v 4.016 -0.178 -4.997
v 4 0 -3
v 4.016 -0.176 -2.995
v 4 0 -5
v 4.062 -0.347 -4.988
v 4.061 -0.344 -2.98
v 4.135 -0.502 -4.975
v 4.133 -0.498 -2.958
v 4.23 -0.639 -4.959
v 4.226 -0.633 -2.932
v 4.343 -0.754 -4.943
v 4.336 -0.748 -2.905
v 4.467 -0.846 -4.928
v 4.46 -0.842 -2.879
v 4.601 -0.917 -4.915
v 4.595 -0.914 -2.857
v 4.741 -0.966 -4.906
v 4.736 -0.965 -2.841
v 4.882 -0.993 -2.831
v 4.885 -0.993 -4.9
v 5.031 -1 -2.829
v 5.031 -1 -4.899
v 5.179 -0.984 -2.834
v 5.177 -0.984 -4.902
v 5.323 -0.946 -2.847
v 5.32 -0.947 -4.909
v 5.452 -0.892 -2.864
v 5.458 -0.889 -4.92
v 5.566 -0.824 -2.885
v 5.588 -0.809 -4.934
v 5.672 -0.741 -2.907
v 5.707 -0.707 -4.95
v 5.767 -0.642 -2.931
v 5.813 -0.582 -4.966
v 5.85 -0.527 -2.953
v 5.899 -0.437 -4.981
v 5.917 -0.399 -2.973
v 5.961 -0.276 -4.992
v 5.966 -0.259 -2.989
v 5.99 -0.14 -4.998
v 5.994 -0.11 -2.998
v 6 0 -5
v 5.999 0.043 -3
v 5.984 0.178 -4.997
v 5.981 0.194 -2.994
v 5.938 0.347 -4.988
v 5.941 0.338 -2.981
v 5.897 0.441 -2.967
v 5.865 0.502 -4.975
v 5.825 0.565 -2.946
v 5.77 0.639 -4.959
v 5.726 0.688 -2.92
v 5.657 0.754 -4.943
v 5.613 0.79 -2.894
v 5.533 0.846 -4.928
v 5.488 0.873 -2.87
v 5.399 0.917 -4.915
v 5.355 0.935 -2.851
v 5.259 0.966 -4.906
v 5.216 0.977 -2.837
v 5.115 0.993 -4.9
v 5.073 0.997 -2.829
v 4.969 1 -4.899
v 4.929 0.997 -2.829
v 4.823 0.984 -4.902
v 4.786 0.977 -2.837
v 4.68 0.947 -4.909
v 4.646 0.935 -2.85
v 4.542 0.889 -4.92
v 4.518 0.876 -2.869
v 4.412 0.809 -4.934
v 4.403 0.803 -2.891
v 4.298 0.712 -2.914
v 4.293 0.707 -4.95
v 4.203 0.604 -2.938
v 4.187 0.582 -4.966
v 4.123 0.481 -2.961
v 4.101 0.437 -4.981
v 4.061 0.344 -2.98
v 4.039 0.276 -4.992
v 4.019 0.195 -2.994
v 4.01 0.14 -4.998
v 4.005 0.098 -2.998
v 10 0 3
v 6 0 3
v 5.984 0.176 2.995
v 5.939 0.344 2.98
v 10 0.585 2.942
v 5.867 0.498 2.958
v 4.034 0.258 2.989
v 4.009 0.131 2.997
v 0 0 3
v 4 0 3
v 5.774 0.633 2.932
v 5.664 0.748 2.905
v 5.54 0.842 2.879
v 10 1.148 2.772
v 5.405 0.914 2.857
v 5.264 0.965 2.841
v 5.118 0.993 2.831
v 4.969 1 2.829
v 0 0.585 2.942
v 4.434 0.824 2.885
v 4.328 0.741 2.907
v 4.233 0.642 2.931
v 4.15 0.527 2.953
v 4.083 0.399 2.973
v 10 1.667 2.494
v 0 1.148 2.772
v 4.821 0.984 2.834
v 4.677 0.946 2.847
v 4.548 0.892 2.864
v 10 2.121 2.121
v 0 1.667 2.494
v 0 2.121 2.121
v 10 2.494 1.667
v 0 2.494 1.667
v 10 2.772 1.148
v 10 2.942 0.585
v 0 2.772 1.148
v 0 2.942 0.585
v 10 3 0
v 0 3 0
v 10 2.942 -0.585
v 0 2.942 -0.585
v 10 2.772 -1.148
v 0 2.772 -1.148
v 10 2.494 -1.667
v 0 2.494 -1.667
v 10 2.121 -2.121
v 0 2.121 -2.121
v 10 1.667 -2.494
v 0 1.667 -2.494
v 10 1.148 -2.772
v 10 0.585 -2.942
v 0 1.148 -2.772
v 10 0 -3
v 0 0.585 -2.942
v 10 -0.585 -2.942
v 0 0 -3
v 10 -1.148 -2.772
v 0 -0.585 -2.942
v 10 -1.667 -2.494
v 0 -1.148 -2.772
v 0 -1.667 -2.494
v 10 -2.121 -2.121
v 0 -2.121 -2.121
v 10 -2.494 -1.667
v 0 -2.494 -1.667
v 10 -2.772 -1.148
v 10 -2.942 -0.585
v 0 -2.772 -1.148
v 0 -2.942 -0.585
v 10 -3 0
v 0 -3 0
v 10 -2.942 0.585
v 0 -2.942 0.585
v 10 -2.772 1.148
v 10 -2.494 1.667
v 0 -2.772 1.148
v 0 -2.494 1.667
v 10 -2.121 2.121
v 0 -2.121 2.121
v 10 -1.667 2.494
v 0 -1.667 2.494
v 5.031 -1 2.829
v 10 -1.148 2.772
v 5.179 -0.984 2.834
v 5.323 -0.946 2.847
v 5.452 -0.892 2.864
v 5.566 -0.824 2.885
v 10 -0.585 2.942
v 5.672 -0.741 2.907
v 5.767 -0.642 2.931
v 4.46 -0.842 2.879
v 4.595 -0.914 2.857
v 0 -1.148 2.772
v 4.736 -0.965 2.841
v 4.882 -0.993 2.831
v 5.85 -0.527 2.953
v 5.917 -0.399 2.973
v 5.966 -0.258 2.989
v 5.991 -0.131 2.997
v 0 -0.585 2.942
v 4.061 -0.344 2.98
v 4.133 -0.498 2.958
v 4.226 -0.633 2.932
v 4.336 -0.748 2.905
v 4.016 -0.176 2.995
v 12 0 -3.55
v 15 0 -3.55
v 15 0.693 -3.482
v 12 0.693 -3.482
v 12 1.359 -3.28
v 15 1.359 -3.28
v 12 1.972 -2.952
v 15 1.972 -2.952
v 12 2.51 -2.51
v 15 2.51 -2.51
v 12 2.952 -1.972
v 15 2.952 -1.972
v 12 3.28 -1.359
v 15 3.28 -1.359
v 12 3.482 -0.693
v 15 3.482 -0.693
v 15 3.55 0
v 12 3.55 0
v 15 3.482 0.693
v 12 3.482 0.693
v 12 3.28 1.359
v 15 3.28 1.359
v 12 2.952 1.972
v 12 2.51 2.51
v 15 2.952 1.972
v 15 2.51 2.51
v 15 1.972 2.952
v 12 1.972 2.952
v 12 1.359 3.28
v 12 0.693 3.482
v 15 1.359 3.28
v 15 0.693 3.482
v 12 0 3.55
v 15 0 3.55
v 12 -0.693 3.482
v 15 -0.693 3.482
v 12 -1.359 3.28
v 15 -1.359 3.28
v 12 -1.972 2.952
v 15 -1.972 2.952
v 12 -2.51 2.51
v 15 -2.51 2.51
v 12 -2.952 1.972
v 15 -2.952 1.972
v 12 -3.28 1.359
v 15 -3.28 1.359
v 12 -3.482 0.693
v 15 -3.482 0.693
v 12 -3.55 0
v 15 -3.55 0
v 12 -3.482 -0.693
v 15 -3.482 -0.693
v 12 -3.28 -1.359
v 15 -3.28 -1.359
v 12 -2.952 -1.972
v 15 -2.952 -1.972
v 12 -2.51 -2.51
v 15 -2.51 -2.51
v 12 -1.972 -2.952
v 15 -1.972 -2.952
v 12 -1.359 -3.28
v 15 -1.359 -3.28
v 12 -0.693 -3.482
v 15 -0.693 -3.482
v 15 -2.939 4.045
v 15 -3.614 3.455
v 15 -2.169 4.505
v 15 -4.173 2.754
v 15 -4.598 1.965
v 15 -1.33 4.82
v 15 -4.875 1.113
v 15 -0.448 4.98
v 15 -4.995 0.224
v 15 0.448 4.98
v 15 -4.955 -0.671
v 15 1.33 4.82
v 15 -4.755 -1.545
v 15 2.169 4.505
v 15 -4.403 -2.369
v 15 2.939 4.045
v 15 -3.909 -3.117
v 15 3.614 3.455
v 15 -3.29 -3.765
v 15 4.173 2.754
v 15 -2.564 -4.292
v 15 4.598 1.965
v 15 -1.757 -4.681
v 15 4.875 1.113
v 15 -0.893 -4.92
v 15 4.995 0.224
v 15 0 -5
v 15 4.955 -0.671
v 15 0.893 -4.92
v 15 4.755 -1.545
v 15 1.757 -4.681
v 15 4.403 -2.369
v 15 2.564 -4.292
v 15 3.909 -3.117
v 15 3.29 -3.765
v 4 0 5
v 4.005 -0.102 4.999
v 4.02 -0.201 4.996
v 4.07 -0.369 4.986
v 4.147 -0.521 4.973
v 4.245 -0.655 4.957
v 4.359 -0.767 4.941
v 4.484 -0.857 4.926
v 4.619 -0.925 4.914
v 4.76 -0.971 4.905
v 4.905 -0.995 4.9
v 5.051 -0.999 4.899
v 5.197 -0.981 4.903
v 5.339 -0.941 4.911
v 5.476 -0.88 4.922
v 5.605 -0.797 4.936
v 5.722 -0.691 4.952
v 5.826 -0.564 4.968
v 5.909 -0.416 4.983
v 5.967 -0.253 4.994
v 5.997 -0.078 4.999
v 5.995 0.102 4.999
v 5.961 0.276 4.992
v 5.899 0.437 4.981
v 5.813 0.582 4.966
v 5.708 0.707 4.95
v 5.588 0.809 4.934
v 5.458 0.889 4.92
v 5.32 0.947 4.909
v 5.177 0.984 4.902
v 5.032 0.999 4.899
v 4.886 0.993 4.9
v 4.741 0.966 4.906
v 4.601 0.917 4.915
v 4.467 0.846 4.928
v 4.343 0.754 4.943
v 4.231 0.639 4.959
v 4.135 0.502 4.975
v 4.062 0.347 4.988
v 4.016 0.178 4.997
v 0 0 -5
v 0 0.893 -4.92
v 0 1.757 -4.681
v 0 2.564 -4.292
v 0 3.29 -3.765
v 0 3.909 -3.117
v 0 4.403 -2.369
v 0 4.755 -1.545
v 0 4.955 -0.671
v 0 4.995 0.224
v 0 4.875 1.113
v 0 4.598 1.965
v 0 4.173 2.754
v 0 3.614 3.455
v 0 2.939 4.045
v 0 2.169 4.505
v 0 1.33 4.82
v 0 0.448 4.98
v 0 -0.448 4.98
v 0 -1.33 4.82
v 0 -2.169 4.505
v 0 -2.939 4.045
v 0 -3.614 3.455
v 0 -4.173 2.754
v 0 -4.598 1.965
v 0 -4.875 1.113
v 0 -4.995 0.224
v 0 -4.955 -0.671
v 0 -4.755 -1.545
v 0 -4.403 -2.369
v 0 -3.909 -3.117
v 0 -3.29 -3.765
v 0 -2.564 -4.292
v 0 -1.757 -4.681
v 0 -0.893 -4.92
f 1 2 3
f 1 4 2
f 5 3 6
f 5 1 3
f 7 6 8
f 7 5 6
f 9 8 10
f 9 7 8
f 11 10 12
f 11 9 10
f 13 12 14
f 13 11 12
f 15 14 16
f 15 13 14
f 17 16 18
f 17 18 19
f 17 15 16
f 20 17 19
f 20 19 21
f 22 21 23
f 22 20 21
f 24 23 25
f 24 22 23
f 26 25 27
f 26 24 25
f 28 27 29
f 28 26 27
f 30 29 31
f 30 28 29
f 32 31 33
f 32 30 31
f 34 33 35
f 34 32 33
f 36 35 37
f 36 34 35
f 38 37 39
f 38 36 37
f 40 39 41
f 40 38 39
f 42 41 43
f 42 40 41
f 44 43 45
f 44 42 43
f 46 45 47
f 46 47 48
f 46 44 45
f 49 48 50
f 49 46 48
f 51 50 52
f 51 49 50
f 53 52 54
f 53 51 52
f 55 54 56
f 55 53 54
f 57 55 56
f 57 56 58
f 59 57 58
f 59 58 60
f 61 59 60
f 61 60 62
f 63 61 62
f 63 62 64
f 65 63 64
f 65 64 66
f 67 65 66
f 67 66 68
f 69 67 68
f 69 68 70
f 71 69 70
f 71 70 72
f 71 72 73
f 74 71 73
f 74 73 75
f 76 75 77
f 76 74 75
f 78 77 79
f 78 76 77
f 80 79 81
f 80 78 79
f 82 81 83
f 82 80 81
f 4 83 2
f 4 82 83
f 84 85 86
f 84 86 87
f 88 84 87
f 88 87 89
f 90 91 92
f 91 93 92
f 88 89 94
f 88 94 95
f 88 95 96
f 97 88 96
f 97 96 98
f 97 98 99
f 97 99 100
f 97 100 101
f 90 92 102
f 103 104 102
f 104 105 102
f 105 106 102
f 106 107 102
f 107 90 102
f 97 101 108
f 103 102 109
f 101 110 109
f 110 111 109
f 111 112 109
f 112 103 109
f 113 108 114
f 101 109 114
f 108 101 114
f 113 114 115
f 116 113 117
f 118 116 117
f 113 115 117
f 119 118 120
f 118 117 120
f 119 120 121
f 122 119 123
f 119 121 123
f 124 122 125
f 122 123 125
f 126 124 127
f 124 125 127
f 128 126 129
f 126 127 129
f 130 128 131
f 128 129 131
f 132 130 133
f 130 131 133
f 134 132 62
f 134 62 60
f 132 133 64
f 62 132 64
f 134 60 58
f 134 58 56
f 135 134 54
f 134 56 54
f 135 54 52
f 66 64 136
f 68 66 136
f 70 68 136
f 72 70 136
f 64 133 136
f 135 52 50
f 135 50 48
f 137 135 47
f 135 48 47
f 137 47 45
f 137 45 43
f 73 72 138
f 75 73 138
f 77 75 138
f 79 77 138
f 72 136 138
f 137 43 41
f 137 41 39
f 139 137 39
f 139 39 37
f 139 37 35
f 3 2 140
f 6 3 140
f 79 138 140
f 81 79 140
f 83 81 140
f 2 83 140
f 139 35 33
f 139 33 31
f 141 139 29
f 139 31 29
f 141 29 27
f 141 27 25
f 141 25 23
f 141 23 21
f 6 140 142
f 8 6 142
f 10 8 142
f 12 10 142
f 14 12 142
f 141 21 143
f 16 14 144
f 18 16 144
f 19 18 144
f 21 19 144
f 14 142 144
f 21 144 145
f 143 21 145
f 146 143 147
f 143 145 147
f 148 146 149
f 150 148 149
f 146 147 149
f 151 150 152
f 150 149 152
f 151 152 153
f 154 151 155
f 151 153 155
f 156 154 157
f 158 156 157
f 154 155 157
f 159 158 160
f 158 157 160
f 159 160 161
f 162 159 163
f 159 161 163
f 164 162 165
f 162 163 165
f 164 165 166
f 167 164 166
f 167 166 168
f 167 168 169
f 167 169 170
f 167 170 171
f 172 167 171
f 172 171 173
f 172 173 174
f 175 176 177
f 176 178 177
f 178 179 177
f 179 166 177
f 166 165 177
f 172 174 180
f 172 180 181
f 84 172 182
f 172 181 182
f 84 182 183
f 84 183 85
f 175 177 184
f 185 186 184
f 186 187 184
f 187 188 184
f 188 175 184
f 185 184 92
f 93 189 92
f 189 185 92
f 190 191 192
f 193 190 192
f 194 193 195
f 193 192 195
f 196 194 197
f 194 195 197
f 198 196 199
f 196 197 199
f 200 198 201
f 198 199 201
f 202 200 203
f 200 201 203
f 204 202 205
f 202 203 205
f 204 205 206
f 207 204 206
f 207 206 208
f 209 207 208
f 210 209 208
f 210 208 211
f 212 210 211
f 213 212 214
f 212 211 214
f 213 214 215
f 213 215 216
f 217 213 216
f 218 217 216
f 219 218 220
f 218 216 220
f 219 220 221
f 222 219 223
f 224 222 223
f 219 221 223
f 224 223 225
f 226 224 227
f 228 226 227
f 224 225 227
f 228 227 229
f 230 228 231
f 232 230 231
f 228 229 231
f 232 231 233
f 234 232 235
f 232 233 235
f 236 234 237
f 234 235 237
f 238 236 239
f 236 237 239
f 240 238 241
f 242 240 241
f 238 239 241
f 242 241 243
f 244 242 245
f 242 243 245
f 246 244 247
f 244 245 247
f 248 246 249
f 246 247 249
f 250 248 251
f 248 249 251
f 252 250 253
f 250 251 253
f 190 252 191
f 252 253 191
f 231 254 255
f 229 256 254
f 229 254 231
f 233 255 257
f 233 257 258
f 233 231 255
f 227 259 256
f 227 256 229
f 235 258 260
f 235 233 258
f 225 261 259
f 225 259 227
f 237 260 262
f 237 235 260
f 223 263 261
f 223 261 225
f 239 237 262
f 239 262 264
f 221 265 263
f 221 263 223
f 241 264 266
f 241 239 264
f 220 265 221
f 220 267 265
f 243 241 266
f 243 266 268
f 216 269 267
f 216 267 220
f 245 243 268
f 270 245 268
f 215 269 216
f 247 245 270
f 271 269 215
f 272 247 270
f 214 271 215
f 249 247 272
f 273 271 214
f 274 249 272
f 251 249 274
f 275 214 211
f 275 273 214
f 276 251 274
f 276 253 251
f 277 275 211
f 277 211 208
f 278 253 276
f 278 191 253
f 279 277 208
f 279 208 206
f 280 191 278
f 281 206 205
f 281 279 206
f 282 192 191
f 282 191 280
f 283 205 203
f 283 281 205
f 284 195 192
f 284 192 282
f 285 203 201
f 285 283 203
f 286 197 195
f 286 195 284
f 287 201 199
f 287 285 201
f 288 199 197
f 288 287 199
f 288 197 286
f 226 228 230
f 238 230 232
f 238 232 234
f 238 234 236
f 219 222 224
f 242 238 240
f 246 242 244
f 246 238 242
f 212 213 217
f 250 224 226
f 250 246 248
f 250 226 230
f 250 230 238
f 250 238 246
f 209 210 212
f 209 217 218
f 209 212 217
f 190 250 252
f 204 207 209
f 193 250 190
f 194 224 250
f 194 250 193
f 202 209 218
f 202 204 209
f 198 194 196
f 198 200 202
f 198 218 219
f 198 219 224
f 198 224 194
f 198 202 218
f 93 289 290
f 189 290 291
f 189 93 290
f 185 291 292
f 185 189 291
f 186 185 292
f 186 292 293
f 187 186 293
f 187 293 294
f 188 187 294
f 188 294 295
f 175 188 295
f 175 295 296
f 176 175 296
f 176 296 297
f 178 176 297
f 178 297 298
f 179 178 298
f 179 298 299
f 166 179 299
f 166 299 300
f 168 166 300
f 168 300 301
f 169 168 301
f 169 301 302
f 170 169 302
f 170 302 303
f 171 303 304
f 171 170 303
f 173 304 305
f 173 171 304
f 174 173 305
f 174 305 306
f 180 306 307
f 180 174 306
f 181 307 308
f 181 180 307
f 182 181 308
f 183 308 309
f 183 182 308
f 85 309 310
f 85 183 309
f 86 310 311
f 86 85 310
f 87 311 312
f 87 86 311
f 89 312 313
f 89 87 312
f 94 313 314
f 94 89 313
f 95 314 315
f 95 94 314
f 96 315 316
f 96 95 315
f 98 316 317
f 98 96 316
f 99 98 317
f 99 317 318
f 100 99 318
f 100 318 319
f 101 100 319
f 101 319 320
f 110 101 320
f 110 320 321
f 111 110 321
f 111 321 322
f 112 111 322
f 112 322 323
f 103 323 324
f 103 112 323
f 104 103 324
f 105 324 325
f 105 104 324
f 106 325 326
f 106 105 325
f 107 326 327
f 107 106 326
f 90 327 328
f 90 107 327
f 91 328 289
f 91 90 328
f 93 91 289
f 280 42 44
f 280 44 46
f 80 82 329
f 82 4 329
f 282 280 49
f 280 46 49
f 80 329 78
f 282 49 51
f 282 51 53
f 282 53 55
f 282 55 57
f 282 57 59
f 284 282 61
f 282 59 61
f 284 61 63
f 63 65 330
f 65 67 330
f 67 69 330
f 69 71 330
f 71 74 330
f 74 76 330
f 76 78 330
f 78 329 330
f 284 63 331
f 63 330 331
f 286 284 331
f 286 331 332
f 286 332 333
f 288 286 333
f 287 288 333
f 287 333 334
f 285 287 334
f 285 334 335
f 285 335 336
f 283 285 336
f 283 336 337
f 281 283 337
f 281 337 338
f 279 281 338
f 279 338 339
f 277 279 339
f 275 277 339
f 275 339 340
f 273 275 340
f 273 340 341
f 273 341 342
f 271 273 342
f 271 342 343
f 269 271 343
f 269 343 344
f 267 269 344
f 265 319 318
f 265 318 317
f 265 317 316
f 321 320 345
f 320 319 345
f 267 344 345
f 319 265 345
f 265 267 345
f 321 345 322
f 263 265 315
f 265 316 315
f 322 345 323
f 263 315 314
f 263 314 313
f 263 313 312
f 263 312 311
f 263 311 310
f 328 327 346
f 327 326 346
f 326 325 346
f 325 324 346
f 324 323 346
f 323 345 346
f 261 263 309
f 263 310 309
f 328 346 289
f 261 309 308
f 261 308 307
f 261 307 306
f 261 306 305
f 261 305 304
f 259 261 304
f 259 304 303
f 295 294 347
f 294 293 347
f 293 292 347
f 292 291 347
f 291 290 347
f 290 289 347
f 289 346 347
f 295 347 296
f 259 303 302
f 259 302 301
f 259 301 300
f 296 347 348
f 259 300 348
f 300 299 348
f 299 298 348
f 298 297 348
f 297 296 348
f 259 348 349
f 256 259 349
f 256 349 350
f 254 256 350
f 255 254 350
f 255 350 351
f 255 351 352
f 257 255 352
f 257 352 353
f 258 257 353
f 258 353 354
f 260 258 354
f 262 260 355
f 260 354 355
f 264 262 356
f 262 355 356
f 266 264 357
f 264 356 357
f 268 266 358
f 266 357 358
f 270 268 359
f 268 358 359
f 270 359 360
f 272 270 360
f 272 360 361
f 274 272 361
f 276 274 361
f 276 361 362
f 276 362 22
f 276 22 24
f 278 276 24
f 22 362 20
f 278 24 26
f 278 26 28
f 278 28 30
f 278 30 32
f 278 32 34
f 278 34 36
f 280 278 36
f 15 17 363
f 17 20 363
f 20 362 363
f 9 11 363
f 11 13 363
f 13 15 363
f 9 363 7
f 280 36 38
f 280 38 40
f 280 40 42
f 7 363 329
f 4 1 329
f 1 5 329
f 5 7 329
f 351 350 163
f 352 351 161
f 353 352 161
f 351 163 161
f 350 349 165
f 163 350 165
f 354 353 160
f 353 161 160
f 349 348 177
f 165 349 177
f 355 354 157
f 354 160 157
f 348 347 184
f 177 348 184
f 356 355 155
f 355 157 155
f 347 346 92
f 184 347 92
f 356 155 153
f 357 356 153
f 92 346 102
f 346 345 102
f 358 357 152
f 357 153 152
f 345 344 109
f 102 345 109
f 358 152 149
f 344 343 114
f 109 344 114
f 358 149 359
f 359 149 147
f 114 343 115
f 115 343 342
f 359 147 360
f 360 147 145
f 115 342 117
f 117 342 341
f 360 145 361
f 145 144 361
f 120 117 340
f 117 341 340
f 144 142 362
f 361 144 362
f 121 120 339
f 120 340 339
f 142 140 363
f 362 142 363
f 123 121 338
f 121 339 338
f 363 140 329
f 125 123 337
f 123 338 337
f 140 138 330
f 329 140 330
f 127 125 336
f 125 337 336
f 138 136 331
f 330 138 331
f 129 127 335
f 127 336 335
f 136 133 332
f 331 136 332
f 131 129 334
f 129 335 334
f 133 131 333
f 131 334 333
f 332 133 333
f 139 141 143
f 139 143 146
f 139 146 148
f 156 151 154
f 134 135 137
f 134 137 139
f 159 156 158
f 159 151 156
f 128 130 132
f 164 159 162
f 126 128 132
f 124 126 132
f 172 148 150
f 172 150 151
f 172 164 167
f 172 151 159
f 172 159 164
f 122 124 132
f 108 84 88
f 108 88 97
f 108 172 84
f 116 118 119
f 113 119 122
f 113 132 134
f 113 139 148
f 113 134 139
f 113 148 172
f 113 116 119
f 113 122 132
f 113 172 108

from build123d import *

# Parameters (mm, degrees)
SKETCH_1_R               = 5
EXTRUDE_1_DEPTH          = 15
SKETCH_2_R               = 3.55
CUT_EXTRUDE_1_DEPTH      = 3
SKETCH_3_R               = 3
CUT_EXTRUDE_2_DEPTH      = 10
CUT_EXTRUDE_3_DEPTH      = 5
CUT_EXTRUDE_3_DEPTH_BACK = 5
SKETCH_4_R               = 1


with BuildPart() as part:
    # 草图1 → 凸台-拉伸1 (new body)
    with BuildSketch(Plane(origin=(0, 0, 0), x_dir=(0, 0, -1), z_dir=(1, 0, 0))):
        Circle(SKETCH_1_R)
    extrude(amount=EXTRUDE_1_DEPTH)

    # 草图2 → 切除-拉伸1 (cut)
    with BuildSketch(Plane(origin=(15, 0, 0), x_dir=(0, 0, -1), z_dir=(1, 0, 0))):
        Circle(SKETCH_2_R)
    extrude(amount=-CUT_EXTRUDE_1_DEPTH, mode=Mode.SUBTRACT)

    # 草图3 → 切除-拉伸2 (cut)
    with BuildSketch(Plane.ZY):
        Circle(SKETCH_3_R)
    extrude(amount=-CUT_EXTRUDE_2_DEPTH, mode=Mode.SUBTRACT)

    # 草图4 → 切除-拉伸3 (cut, two sides: drawn at the far end of the back side and taken through both)
    with BuildSketch(Plane.XY.offset(-CUT_EXTRUDE_3_DEPTH_BACK)):
        with Locations((5, 0)):
            Circle(SKETCH_4_R)
    extrude(amount=CUT_EXTRUDE_3_DEPTH + CUT_EXTRUDE_3_DEPTH_BACK, mode=Mode.SUBTRACT)


solid = part.part
